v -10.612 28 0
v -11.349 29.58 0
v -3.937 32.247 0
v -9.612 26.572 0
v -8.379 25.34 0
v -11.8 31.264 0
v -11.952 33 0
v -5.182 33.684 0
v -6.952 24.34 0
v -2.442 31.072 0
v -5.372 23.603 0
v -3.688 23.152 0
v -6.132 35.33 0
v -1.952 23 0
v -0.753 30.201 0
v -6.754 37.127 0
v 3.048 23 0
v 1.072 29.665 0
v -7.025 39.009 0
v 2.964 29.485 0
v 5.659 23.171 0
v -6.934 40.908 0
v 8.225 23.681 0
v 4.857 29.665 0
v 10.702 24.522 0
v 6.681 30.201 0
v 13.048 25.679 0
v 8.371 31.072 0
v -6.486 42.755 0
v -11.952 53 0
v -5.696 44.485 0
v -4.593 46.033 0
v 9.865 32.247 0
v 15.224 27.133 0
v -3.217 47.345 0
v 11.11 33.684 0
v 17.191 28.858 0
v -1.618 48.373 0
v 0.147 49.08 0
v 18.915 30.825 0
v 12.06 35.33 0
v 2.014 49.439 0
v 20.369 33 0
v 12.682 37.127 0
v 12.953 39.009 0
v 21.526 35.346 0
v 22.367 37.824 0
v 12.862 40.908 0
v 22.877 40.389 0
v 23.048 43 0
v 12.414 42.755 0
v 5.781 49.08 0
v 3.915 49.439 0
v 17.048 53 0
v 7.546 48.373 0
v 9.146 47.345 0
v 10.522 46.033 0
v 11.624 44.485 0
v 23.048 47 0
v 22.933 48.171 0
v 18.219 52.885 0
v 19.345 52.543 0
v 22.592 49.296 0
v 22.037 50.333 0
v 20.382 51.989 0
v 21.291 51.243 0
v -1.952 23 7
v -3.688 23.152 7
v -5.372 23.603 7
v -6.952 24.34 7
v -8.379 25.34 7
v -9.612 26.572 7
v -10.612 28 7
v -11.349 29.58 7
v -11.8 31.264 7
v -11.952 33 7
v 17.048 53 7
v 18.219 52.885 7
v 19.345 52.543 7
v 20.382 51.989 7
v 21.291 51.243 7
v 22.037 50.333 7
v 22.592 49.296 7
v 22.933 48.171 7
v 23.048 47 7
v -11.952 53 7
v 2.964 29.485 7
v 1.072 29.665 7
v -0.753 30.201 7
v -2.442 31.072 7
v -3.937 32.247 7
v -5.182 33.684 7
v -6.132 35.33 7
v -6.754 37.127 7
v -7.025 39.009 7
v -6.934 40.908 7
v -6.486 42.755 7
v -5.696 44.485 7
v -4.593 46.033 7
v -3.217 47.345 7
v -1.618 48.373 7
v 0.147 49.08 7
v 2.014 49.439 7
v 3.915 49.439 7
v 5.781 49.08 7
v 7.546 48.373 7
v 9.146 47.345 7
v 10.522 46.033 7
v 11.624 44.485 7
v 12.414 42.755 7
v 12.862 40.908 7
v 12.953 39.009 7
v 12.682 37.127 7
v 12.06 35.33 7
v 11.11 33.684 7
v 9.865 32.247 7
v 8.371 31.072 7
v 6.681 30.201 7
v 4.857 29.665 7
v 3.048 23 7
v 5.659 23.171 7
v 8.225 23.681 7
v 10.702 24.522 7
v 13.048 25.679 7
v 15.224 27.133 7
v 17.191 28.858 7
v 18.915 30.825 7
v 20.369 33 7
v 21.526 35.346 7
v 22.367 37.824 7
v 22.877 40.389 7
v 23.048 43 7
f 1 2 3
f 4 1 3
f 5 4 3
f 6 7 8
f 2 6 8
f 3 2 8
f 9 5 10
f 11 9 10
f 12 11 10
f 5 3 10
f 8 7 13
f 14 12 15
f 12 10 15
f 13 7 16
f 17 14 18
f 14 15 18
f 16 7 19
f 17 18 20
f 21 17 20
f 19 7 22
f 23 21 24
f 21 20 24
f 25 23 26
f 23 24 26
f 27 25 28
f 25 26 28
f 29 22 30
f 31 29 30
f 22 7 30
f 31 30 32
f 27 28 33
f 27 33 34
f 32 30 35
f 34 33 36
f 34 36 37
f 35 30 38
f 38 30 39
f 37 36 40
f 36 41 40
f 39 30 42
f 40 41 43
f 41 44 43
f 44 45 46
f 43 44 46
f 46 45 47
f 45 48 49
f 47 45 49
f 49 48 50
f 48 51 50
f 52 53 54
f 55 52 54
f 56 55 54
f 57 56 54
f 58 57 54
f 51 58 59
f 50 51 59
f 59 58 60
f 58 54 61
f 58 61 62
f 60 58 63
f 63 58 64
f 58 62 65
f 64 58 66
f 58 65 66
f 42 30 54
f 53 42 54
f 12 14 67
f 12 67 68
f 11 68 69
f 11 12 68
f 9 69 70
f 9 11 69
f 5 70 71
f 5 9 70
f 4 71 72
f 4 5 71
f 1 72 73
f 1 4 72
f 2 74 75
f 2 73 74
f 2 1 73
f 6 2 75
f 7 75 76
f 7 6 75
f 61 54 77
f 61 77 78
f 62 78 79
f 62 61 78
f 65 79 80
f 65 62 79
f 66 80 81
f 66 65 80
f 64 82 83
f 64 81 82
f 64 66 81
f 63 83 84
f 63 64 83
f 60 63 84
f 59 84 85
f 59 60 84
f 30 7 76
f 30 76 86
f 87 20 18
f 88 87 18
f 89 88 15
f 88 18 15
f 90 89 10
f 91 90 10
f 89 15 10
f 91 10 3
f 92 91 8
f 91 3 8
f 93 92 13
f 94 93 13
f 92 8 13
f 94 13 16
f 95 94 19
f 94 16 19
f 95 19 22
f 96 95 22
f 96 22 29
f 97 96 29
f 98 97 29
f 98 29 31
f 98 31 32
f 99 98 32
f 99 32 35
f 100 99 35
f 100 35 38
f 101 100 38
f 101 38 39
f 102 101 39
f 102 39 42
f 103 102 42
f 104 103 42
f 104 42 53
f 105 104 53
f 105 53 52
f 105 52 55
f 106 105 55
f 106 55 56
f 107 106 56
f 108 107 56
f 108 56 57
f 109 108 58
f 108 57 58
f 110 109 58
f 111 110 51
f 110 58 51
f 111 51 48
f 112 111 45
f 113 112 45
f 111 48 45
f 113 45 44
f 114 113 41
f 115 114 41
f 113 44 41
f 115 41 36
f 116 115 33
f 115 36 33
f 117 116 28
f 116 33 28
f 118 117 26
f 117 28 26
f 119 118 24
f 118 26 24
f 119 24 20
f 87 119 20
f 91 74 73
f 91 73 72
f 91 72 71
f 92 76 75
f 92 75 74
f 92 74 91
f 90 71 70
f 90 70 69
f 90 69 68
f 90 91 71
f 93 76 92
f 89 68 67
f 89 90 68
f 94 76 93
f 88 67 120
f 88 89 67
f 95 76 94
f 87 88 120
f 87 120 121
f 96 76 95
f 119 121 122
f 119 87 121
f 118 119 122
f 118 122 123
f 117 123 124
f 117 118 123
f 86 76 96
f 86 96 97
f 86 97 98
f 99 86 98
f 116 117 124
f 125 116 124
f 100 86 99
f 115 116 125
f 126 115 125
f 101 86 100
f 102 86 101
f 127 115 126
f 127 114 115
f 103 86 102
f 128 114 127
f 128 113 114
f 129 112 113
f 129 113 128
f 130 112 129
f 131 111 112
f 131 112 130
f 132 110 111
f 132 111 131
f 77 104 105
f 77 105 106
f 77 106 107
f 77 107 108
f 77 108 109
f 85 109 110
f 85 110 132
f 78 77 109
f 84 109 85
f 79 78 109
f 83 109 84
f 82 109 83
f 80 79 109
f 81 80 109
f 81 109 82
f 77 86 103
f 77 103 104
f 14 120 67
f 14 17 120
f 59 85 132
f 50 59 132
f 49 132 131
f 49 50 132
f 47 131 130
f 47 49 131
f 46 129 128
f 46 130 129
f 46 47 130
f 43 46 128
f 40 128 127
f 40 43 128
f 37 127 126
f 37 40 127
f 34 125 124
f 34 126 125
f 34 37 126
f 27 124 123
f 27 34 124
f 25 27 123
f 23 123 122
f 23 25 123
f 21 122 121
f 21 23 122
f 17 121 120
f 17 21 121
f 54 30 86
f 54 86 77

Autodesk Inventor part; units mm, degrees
ref_plane "YZ Plane" through (0, 0, 0) normal (1, 0, 0) x (0, 1, 0)
ref_plane "XZ Plane" through (0, 0, 0) normal (0, 1, 0) x (-1, 0, 0)
ref_plane "XY Plane" through (0, 0, 0) normal (0, 0, 1) x (1, 0, 0)
sketch "Sketch1" plane through (0, 0, 0) normal (0, 0, 1) x (1, 0, 0)
  line L0 (-11.9516, 53) -> (17.0484, 53)
  line L1 (23.0484, 47) -> (23.0484, 43)
  line L2 (3.0484, 23) -> (-1.9516, 23)
  line L3 (-11.9516, 33) -> (-11.9516, 53)
  arc A0 (23.0484, 47) -> (17.0484, 53) centre (17.0484, 47) ccw
  arc A1 (3.0484, 23) -> (23.0484, 43) centre (3.0484, 43) ccw
  arc A2 (-11.9516, 33) -> (-1.9516, 23) centre (-1.9516, 33) ccw
  point P0 (0, 0)
  point P1 (23.0484, 23)
  point P2 (-11.9516, 23)
  dimension "d0" = 6
  dimension "d1" = 30
  dimension "d2" = 35
  dimension "d3" = 20
  dimension "d4" = 10
extrude "Extrusion1" add sketch "Sketch1" along normal blind 7
sketch "Sketch2" plane through (0, 0, 7) normal (0, 0, 1) x (1, 0, 0)
  point P0 (0, 0)
  point P1 (2.9641, 39.4846)
hole "Hole1" at (2.9641, 39.4846, 7) direction (0, 0, -1) diameter 20 end through all
properties part number "McCrea_oko_walle"
